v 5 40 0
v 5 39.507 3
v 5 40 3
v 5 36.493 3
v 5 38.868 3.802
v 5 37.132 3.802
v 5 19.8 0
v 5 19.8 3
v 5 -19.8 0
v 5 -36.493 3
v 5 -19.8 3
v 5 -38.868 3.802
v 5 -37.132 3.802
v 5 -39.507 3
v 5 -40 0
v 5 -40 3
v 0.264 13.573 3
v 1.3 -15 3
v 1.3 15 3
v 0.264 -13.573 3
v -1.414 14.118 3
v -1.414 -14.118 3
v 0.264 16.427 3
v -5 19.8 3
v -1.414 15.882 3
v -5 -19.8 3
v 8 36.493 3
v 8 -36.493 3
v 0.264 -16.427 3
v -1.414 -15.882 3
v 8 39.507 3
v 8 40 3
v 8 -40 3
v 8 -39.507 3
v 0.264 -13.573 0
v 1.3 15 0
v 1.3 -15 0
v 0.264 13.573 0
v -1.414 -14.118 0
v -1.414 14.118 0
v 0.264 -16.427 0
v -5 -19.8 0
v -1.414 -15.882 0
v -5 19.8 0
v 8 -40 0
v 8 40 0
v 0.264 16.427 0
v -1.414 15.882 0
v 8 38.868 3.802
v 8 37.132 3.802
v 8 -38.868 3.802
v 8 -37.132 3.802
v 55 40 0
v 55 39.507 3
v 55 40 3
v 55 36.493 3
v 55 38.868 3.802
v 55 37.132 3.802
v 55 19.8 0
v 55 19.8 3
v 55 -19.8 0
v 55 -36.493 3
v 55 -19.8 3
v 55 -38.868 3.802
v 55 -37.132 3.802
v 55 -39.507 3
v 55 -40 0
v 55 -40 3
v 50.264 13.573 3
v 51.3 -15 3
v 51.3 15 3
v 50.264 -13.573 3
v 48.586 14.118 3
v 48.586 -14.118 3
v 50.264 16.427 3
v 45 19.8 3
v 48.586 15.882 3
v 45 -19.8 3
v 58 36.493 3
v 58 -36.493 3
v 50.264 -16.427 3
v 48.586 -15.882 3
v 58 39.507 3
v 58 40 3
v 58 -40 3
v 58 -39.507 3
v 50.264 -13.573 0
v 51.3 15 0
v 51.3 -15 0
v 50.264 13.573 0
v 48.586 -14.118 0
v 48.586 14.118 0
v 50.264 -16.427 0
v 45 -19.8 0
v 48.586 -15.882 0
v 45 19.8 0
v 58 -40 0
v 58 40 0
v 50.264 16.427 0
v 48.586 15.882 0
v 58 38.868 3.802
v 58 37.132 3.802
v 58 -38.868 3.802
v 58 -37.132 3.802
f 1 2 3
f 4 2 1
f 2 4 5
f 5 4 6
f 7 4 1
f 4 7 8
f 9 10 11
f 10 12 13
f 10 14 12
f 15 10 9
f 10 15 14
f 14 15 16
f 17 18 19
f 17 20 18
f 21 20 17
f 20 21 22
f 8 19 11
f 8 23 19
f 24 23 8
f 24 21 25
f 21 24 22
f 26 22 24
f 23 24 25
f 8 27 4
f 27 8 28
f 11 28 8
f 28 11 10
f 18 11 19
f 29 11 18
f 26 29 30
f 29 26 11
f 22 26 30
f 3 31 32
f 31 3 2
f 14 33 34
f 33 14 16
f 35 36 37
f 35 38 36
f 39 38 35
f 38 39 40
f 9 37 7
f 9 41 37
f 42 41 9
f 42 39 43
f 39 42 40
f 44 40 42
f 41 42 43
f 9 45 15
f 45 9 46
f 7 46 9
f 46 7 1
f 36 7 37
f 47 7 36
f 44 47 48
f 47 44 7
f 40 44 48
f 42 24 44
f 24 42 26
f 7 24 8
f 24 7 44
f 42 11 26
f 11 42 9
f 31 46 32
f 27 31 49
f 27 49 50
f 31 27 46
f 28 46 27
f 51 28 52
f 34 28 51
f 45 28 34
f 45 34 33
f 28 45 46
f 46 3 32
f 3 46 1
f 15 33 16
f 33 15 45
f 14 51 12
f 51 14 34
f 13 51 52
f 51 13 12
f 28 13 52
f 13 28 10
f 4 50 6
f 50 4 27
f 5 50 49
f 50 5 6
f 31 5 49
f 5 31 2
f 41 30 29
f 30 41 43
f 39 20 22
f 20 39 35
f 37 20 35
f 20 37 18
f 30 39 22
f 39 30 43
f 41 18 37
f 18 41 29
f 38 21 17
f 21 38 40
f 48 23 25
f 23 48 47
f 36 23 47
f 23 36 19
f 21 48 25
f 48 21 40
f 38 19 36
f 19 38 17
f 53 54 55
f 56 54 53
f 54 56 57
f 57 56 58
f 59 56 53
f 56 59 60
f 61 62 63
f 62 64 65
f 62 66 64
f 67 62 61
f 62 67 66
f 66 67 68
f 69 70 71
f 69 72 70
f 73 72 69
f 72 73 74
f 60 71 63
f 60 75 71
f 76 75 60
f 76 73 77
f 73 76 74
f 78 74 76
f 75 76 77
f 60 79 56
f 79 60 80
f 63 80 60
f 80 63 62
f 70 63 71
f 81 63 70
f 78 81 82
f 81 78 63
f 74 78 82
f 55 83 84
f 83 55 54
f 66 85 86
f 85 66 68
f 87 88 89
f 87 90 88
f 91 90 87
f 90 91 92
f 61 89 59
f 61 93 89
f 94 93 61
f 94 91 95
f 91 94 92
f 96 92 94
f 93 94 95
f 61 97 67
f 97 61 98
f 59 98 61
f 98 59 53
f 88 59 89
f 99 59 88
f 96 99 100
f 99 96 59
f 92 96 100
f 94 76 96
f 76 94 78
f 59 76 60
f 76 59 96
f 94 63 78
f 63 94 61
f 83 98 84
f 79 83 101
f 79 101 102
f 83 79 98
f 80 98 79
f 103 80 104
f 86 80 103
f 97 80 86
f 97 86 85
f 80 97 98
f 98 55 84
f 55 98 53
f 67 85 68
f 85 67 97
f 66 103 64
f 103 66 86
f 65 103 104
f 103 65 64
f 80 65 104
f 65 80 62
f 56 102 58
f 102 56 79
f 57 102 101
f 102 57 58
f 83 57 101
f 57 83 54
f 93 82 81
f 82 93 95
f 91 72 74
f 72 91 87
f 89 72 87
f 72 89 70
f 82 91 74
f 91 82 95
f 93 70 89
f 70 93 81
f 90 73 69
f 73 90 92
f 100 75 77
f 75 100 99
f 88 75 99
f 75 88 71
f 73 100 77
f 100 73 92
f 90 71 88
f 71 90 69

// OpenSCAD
// file: config_4x5.scad
/*
This is the base configuration file for the 4x5" format
# we are not using the exact ANSI measures, but slightly rounded measures for slight simplification
*/
vStabilizerTotal_h = 7;

// general tolerance
vTolerance = 0.2;

// sheet film and cassette measurements (roughly based on the ANSI measurements)
vFilmSheet_l = 127;
vFilmSheet_w = 102;
vCassette_l = 160; // A min
vCassette_w = 121; // B max
vCassette_h = 13.2; // C max
vLightTrap_l = 2; // M2
vLightTrap_w = vCassette_w;
vLightTrap_h = 1.5; // M1
vLightTrap_offsetX = 141; // G max
vFilmWindow_l = 121;
vFilmWindow_w = 101;
vFilmWindow_offsetX = 16;
vGroundGlass_offsetZ = 5;

// Graflok
vGraflok_h = 6; // this is not the official measurement, just measured from a camera 

// lens board measures (we are using Wista/Technika-style lensboards)
vLensboard_l = 100;
vLensboard_w = 97;
vLensboard_h = 2;
vLensboard_offsetX = -(vLensboard_l+3)/2; // caution: we have an asymetric offset!
vLensboard_offsetY = -vLensboard_w/2;
vLensboardHole_d = 85;
vLensboardLighttrap_d = 89;
vLensboardLighttrap_h = 1+vTolerance;

// bellows frame measures - the bellows frame design is derived from standardcameras.com
// back frame
vBellowsBackInner_l = 144; //???? check and replace with the measurement from your bellows!
vBellowsBackInner_w = vBellowsBackInner_l;
vBellowsBackOuter_l = vBellowsBackInner_l+1;
vBellowsBackOuter_w = vBellowsBackOuter_l;

vBellowsBackFrameOuter_l = 159;
vBellowsBackFrameOuter_w = vBellowsBackFrameOuter_l;
vBellowsBackFrameOuter_h = 7;
vBellowsBackFrameInner_l = 135;
vBellowsBackFrameInner_w = vBellowsBackFrameInner_l;
vBellowsBackFrameInner_h = 5;

vBellowsBackLightTrapOuter_l = vBellowsBackFrameInner_l+2*2;
vBellowsBackLightTrapOuter_w = vBellowsBackLightTrapOuter_l;
vBellowsBackLightTrap_h = 3;

//vBellowsBackFrameScrewHole_d = 2;
//vBellowsBackFrameScrewHole_h = 10;
vBellowsBackFrameScrewHole_offsetXY = 70;
vBellowsBackFrameScrewHole_offsetZ = vBellowsBackFrameOuter_h/2;

// front frame
vBellowsFrontInner_l = 94; //???? check and replace with the measurement from your bellows!
vBellowsFrontInner_w = vBellowsFrontInner_l;
vBellowsFrontOuter_l = vBellowsFrontInner_l+1;
vBellowsFrontOuter_w = vBellowsFrontOuter_l;

vBellowsFrontFrameOuter_l = 104;
vBellowsFrontFrameOuter_w = vBellowsFrontFrameOuter_l;
vBellowsFrontFrameOuter_h = 7;
vBellowsFrontFrameInner_l = 82;
vBellowsFrontFrameInner_w = vBellowsFrontFrameInner_l;
vBellowsFrontFrameInner_h = 5;

vBellowsFrontLightTrapOuter_l = vBellowsFrontFrameInner_l+2*2;
vBellowsFrontLightTrapOuter_w = vBellowsFrontLightTrapOuter_l;
vBellowsFrontLightTrap_h = 0;

//vBellowsFrontFrameScrewHole_d = 2;
//vBellowsFrontFrameScrewHole_h = 10;
vBellowsFrontFrameScrewHole_offsetXY = 40;
vBellowsFrontFrameScrewHole_offsetZ = vBellowsFrontFrameOuter_h/2;

// body dimensions
vWall_strength = 5;
vBodyOuter_l = 185; // make sure this is at least 4*vWall_strength larger than vBellowsBackFrameOuter_l!
vBodyOuter_w = 170; // make sure this is at least 2*vWall_strength larger than vBellowsBackFrameOuter_l!
vBodyOuter_h = 65;
vBodyEdge_r = vWall_strength;

// we will center our model on the Y axis and on the center of the bellows frame
// at least for the 4x5 version, we have to do an asymetric offset of 2.5mm on the X-axis 
vAsymOffsetX = -2.5;  

// back plate
vBackPlateLength = 160; // we will probably use about the same size as the bellows back frame
vBackPlateStrength = vWall_strength;

// hinges for front lid
vHingeInnerDistance = 100;
vHingeBaseWidth = 20;
vHingeHole = 4;

// lid lock measures
vLidLockBase_d = 8;
vLidLockHole_distance = 70;

// rail dimensions
vLowerRail_w = 90;
vUpperRail_w = vLowerRail_w;

// cutout for stop indents
vStopIndent_l = 4;
vStopIndent_h = 5;
vStopIndentDistance = 25; // shorter than 25 is not necessary
vStopIndent_offsetX = 20; // don't go shorter than 20 if you intend to use a 90mm lens!

// for all dovetails we use a base width of 5mm and a base height of 5mm
// we are applying tolerances to the inner AND outer part of a dovetail, in width and height
vDoveTail_w = 5;
vDoveTail_h = 5;
vDoveTail_tolerance = 0.2;

// front standard carrier / slider
// width is depending on vUpperRail_w
vSliderBase_w = vUpperRail_w + (4*vDoveTail_w);
vSliderBase_l = 40; // make sure to have enough space in the body.


// lever plate 
vLeverPlateBase_w = vUpperRail_w - (8*vDoveTail_w);
vLeverPlateBlock_w = 25;
vLeverPlateBlock_l = vSliderBase_l-(2*vDoveTail_w);

vFrontStandard_h = 130;
vFrontStandardSlot_h = vFrontStandard_h - 30;

// lensboard carrier
vFrontPlate_length = vSliderBase_w+6; // vSliderBase_w is a bit too tight for 4x5", so there we will add 5mm, for 5x7 vSliderBase_w is OK to get a squared lensboard carrier
vFrontPlate_width = vSliderBase_w; //vFrontPlate_length;
vFrontPlate_height = 16;
vEdgeCutCylinder = floor(sqrt(2*pow(vFrontPlate_width,2)))-5;

vTiltDovetailBase_d1 = 30;
vTiltDovetailBase_d2 = vTiltDovetailBase_d1+(2*vDoveTail_w);
vTiltDovetailBaseBlock_d = vTiltDovetailBase_d1+(4*vDoveTail_w);

vTiltDovetail_d1 = vTiltDovetailBase_d1-vTolerance;
vTiltDovetail_d2 = vTiltDovetailBase_d2-vTolerance;
vTiltDovetail_h = vDoveTail_w-vTolerance;

vTiltDovetailCutout_d1 = vTiltDovetailBase_d2+vTolerance;
vTiltDovetailCutout_d2 = vTiltDovetailBase_d1+vTolerance;

vAxisHole_d = 10+vTolerance;
vAxisHole_h = vDoveTail_w+vTolerance;

vTiltLockBolt_d = 12;
vTiltLockBolt_h = 14;
//vTiltLockBoltHole_d = 8;
//vTiltLockBoltHole_h = vTiltLockBolt_h;

vTiltHeight = 50;
vTiltRadius = vFrontPlate_length/2;
vTiltAngleMinus = -7;
vTiltAnglePlus = 7;
vTiltAxis_d = 10-vTolerance;

// focusing rod
vFocusingRod_d = 6;
vFocusingKnob_d = 25;
vFocusingKnob_h = 20;

// stabilizer measures (just the outer measures of our stabilizer block, not the tripod slider)
vStabilizerBase_l = 135;
vStabilizerBase_w = 90;  
vStabilizerBase_h = 7;
vStabilizerDovetailBase_w = 50;
// screw holes for the stabilizer
vLidHoleCount_x = 4;
vLidHoleDist_x = 35;
vLidHoleCount_y = 2;
vLidHoleDist_y = 60;


// screw diameters, length is individually set
vScrew1Hole_d = 3;
vScrew1ThreadHole_d = 2.2;
vScrew2Hole_d = 2;
vScrew2ThreadHole_d = 1.4;


// Dimensions for small heat set insert holes.
// Sized for M2 inserts, 3 mm depth, 3.5 mm max OD
// (may be labelled M2x3.5x3)
vInsertM2Hole_d = 3.2;
vInsertM2MinDepth_h = 4.0;
vInsertM2Size_d = 3.5;
vInsertM2Depth_h = 3.0;

// Dimensions for heat set insert holes.
// Sized for "Voron standard" M3 inserts, 4 mm depth, 5 mm max OD
// (variously labelled M3x4x5 or M3x5x4)
vInsertM3Hole_d = 4.7;
vInsertM3MinDepth_h = 5.0;
vInsertM3Size_d = 5.0;
vInsertM3Depth_h = 4.0;

// Dimensions for large heat set insert holes.
// Sized for M5 inserts, 5 mm depth, 7 mm max OD
// (may be labelled M5x7x5)
vInsertM5Hole_d = 6.7;
vInsertM5MinDepth_h = 6.0;
vInsertM5Size_d = 7.0;
vInsertM5Depth_h = 5.0;


// Handle strap
vHandleStrap_h = 2.0;       // Thickness of the strap in mm
vHandleStrap_w = 15.0;      // Width of the strap in mm
vHandleStrap_l = 145.0;     // Total length of the strap in mm
vHandleStrapMovement_l = 35.0;   // Total amount the strap moves, in mm. Each side moves half this amount.
vHandleStrapCutout_w = 4.0;      // Width of the central cutout, in mm
vHandleStrapSlotOffsetFar = vHandleStrap_l/2 - vHandleStrap_w/2;
vHandleStrapSlotOffsetNear = vHandleStrapSlotOffsetFar - vHandleStrapMovement_l/2;
vHandleStrapCoverExtra_l = 5.0;
vHandleStrapHoleSize_d = 3.0;
vStrapHoleDelta = vHandleStrapSlotOffsetNear-vHandleStrapCoverExtra_l+vHandleStrapHoleSize_d/2;
vStrapHoleSpacing = vHandleStrapMovement_l/2 + vHandleStrap_w/2;
// file: modules.scad
/*
This is a collection of the modules which are used heavily within the whole project.
Almost all parts rely on the modules to remain "as is", especially regarding their current orientation.
So please act very carefully here, otherwise you may screw up the complete design!

*/
include <baseconfig.scad>;


// roof module - this is heavily used for dovetail cutouts
// please keep as is
module roof(l, w, h){
    polyhedron(
        points=[
            [0,0,0],
            [l,0,0],
            [l,w,0],
            [0,w,0],
            [0,w/2,h],
            [l,w/2,h]
            ],
        faces=[
            [0,1,2,3],
            [0,4,1],
            [1,4,5,2],
            [2,5,3],
            [3,5,4,0]
            ]
            );
    };

// a wedge module - this is heavily used for cutting edges
// please keep as is    
module wedge(l, w, h) {
    polyhedron(
            points=[
                [0,0,0],
                [l,0,0],
                [l,w,0],
                [0,w,0],
                [0,0,h],
                [l,0,h]
            ],
            faces=[
                [0,3,2,1],
                [0,1,5,4],
                [1,2,5],
                [2,3,4,5],
                [3,0,4]
            ]
    );
   };

// simple tube module.   
module tube(d1, d2, h) {
    difference() {
        cylinder(d=d1, h=h);
        cylinder(d=d2, h=h);
        };
    };

// mainly used for making holes for countersunk screws
// please keep as is    
module countersunk_screw(vScrew_d, vScrew_l){
    union(){
    cylinder(d=vScrew_d, h=vScrew_l);
    cylinder(d1=vScrew_d*2, d2=0, h=vScrew_d);
    };
};

// module for making hexagons, e.g. hex nuts. kw is the key width
// please keep as is
module hex(kw, h) {
	render()
        translate([0, 0, h/2])
            intersection_for(a = [0, 120, 240]) {
                rotate([0, 0, a])
                    cube([kw, 3 * kw, h], true);
                }
}


// Heatset insert
// d: Thread diameter
// od: Outer diameter
// l: Total length
module insert(d, od, l)
{
    echo(Insert = d, od, l);
    difference() {
        cylinder(l, d=od, $fn=15);
        translate([0, 0, -0.5]) cylinder(l+1, d=d, $fn=15);
        };
}

module insert_m2()
{
    color("gold") insert(2, vInsertM2Size_d, vInsertM2Depth_h);
}

module insert_m3()
{
    color("gold") insert(3, vInsertM3Size_d, vInsertM3Depth_h);
}

module insert_m5()
{
    color("gold") insert(5, vInsertM5Size_d, vInsertM5Depth_h);
}

// Countersunk screw, metric, for display
// Example: https://www.aliexpress.com/item/1005007838338973.html
module screw_cs(l, d=3, dk=6, s=2, t=1) {
    // l: total length (including head) in mm
    // d: thread diameter (eg 3 for M3)
    // dk: max head diameter
    // s: hex socket flat-to-flat size
    // t: hex socket depth
    echo(CountersunkScrew = d, l);
    difference() {
        union() {
            cylinder(h=l, r=d/2, $fn=15);
            cylinder(h=(dk-d)/2, r1=dk/2, r2=d/2, $fn=15);
            }
        cylinder(h=t, r=s/2*2/sqrt(3), $fn=6);
    }
}

module screw_m3_cs(l) {
    color("silver") screw_cs(l, d=3, dk=6, s=2, t=1);
}

module screw_m2_cs(l) {
    color("silver") screw_cs(l, d=2, dk=3.8, s=1.5, t=0.75);
}
module screw_m5_cs(l) {
    color("silver") screw_cs(l, d=5, dk=9.5, s=3, t=1.6);
}

// Button head screw, metric, for display
// Example: https://www.aliexpress.com/item/32967225441.html
module screw_bh(l, d=3, k=1.5, dk=5.5, s=2, t=1) {
    // l: shaft length (NOT including head) in mm
    // d: thread diameter (eg 3 for M3)
    // k: head depth
    // dk: head max diameter
    // s: hex socket flat-to-flat size
    // t: hex socket depth
    echo(ButtonheadScrew = d, l);
    difference() {
        union() {
            translate([0, 0, k]) cylinder(h=l, r=d/2, $fn=15);
            difference() {
                translate([0, 0, k]) intersection() {
                    sphere(d=dk, $fn=15);
                    translate([-dk/2, -dk/2, -dk]) cube(dk);
                }
                translate([-dk/2, -dk/2, -dk]) cube(dk);
            }
        }
        cylinder(h=t, r=s/2*2/sqrt(3), $fn=6);
    }
}

module screw_m2_bh(l) {
    color("silver") screw_bh(l, d=2, dk=3.4, s=1.175, t=0.6);
}

module screw_m3_bh(l) {
    color("silver") screw_bh(l, d=3, dk=5.7, s=2, t=1);
}


module nut_m5() {
    echo(Nut = 5);
    difference() {
        rotate([0, 0, 30]) cylinder(h=3.9, d=8*2/sqrt(3), $fn=6);
        cylinder(h=5, d=5, $fn=15);
        }
    }
    
    
module thumbscrew(bolt_d, bolt_dk, screw_d, screw_h, n_knurls, knurl_d, knurl_f) {
    // bolt_d:  central bolt diameter
    // bolt_dk: bolt head max diameter
    // screw_d: thumbscrew outer diameter
    // screw_h: thumbscrew height
    // n_knurls: number of knurls
    
    min_knurl_offset = screw_d/2 - knurl_d;
    max_knurl_offset = screw_d/2 + knurl_d;
    knurl_offset = min_knurl_offset + knurl_f*(max_knurl_offset - min_knurl_offset);
    
    difference()
    {
        union()
        {
            translate([0, 0, 1]) cylinder(screw_h-2, d=screw_d);
            cylinder(1, d1=screw_d-1, d2=screw_d);
            translate([0, 0, screw_h-1]) cylinder(1, d1=screw_d, d2=screw_d-1);
        }
        cylinder(screw_h, d=bolt_d);
        cylinder(bolt_dk/2, d1=bolt_dk, d2=0);
        for (i = [1:n_knurls])
        {
            rotate([0, 0, i*360/(n_knurls)]) translate([knurl_offset, 0, 0]) cylinder(screw_h, d=knurl_d);
        }
    }
}

module thumbscrew_m5(screw_d, screw_h, n_knurls, knurl_d, knurl_f) {
    thumbscrew(5, 9.5, screw_d, screw_h, n_knurls, knurl_d, knurl_f);
}


module t6_flange_coupler() {
    // T6 flange coupler
    // Example: https://www.aliexpress.com/item/1005008049363389.html
    echo(FlangeCoupler = 6);
    difference() {
        union() {
            translate([0, 0, 2]) cylinder(h=10, d=10);
            cylinder(h=2, d=22);
        }
        cylinder(h=12, d=6);
        translate([0, 15, 7]) rotate([90, 0, 0]) cylinder(h=30, d=3);
        for (i = [0:3]) {
            rotate([0, 0, 45+90*i]) translate([-8, 0, 0]) cylinder(h=2, d=3);
        }
    }
}


module AXK0619_thrust_bearing() {
    echo(ThrustBearing = "AXK0619");
    difference() {
        cylinder(h=4, d=19);
        cylinder(h=4, d=6);
    }
}


module t6_lead_screw(l) {
    echo(LeadScrewT6 = l);
    color("silver") cylinder(h=l, d=6);
}

module t6_lead_screw_nut() {
    echo("LeadScrewT6Nut");
    intersection()
    {
        difference() {
            union() {
                cylinder(h=15, d=12);
                translate([0, 0, 1.5]) cylinder(h=3.5, d=24);
            }
            cylinder(h=15, d=6);
        }  
        translate([-50, -12.5/2, -50]) cube([100, 12.5, 100]);
    }
}

module threaded_rod_m5(l) {
    echo(ThreadedRodM5 = l);
    color("silver") cylinder(h=l, d=5);
}

module smooth_rod_m4(l) {
    echo(SmoothRodM4 = l);
    color("silver") cylinder(h=l, d=4);
}


module screw_m3_grub(l) {
    echo(GrubScrew = 3, l);
    color("silver") cylinder(h=l, d=3, $fn=15);
}


module screw_m5_grub(l) {
    echo(GrubScrew = 5, l);
    color("silver") cylinder(h=l, d=5, $fn=15);
}


module washer_m6() {
    // M6x12x0.8 washer
    echo(Washer = 6, 0.8);
    difference() {
        cylinder(h=0.8, d=12);
        cylinder(h=0.8, d=6.6);
    }
}


module springwasher_m6() {
    // M6x12x1.5 washer (compresses to 0.5)
    // Show as compressed (~0.5 mm height)
    echo(SpringWasher = 6);
    difference() {
        cylinder(h=0.5, d=12);
        cylinder(h=0.6, d=6);
    }
}


module chamfer_cylinder(h, d, c=0) {
    if (h >= c) {
        cylinder(h=h-c, d=d);
        translate([0, 0, h-c]) cylinder(h=c, d1=d, d2=d-c);
    } else {
        cylinder(h=h, d=d);
    }
}

module chamfer_cube(w, d, h, c=0) {
    if (h >= c) {
        difference() {
            cube([w, d, h]);
            translate([-c, 0, h]) rotate([0, 45, 0]) cube([sqrt(2)*c, d, sqrt(2)*c]);
            translate([w-c, 0, h]) rotate([0, 45, 0]) cube([sqrt(2)*c, d, sqrt(2)*c]);
            translate([0, 0, h-c]) rotate([45, 0, 0]) cube([w, sqrt(2)*c, sqrt(2)*c]);
            translate([0, d, h-c]) rotate([45, 0, 0]) cube([w, sqrt(2)*c, sqrt(2)*c]);
        }
    } else {
        cube(wdh);
    }
}

module rounded_rect(l, w, h) {
    union()
    {
        translate([-l/2+w/2, 0, 0]) cylinder(h=h, d=w);
        translate([l/2-w/2, 0, 0]) cylinder(h=h, d=w);
        translate([-(l-w)/2, -w/2, 0]) cube([l-w, w, h]);
    }
}
// file: baseconfig.scad
/*
Here we define some variables which are independent from the camera format
*/


// some generic variables

// we are including a format specific configuration sheet - but make sure to include only one!

include <config_4x5.scad>;
// include <config_5x7.scad>;
// include <config_8x10.scad>;

// Arca Swiss tripod plate
// caution: some Arca Swiss compatible tripod heads may have slight variations
// vArca_length = xx; // the length is irrelevant here
vArca_width = 38;
vArca_height = 7;
vArcaBase_cutout = 4;
vArcaBase_height = 1.5;
// main file
// loading the base configuration
include <baseconfig.scad>;

// some modules such as hex, countersunk screws, roof, wedge are available in a module file
use <modules.scad>;

module ground_glass_clamp() {

vGGClampPlate_l = 10;
vGGClampPlate_w = 40-(2*vTolerance);
vGGClampPlate_h = 3;
vGGClampPlate_offsetX = -vGGClampPlate_l/2;
vGGClampPlate_offsetY = -vGGClampPlate_w/2;
vGGClampPlate_offsetZ = 0;

vGGClampArm_l = 3;
vGGClampArm_w = 80;
vGGClampArm_h = 3;
vGGClampArm_offsetX = vGGClampPlate_l/2;
vGGClampArm_offsetY = -vGGClampArm_w/2;
vGGClampArm_offsetZ = 0;

vGGClampButton_d = vGGClampArm_h+1;
vGGClampButton_h = vGGClampArm_l;
vGGClampButton_offsetX = vGGClampPlate_l/2;
vGGClampButton_offsetY = -(vGGClampArm_w-vGGClampButton_d)/2;
vGGClampButton_offsetZ = vGGClampButton_d/2;

vScrewHole_d = 3;
vScrewHole_h = vGGClampPlate_h;
vScrewHole_offsetX = -vTolerance; 
vScrewHole_offsetY = -15;
vScrewHole_offsetZ = 0;


difference(){
    union(){
        // clamp plate
        translate([vGGClampPlate_offsetX, vGGClampPlate_offsetY, vGGClampPlate_offsetZ])
            cube([vGGClampPlate_l, vGGClampPlate_w, vGGClampPlate_h]);
        
        // clamp arms
        translate([vGGClampArm_offsetX, vGGClampArm_offsetY, vGGClampArm_offsetZ])
            cube([vGGClampArm_l, vGGClampArm_w, vGGClampArm_h]);
        
        // clamp buttons
        translate([vGGClampButton_offsetX, vGGClampButton_offsetY, vGGClampButton_offsetZ])
            rotate([0, 90, 0])
                cylinder(d=vGGClampButton_d, h=vGGClampButton_h);
        translate([vGGClampButton_offsetX, -vGGClampButton_offsetY, vGGClampButton_offsetZ])
            rotate([0, 90, 0])
                cylinder(d=vGGClampButton_d, h=vGGClampButton_h);
        };
    
    // screw holes
    translate([vScrewHole_offsetX, vScrewHole_offsetY, vScrewHole_offsetZ])
        cylinder(d=vScrewHole_d, h=vScrewHole_h );
    translate([vScrewHole_offsetX, -vScrewHole_offsetY, vScrewHole_offsetZ])
        cylinder(d=vScrewHole_d, h=vScrewHole_h );

};

};

translate([50, 0, 0]) ground_glass_clamp();
ground_glass_clamp();
